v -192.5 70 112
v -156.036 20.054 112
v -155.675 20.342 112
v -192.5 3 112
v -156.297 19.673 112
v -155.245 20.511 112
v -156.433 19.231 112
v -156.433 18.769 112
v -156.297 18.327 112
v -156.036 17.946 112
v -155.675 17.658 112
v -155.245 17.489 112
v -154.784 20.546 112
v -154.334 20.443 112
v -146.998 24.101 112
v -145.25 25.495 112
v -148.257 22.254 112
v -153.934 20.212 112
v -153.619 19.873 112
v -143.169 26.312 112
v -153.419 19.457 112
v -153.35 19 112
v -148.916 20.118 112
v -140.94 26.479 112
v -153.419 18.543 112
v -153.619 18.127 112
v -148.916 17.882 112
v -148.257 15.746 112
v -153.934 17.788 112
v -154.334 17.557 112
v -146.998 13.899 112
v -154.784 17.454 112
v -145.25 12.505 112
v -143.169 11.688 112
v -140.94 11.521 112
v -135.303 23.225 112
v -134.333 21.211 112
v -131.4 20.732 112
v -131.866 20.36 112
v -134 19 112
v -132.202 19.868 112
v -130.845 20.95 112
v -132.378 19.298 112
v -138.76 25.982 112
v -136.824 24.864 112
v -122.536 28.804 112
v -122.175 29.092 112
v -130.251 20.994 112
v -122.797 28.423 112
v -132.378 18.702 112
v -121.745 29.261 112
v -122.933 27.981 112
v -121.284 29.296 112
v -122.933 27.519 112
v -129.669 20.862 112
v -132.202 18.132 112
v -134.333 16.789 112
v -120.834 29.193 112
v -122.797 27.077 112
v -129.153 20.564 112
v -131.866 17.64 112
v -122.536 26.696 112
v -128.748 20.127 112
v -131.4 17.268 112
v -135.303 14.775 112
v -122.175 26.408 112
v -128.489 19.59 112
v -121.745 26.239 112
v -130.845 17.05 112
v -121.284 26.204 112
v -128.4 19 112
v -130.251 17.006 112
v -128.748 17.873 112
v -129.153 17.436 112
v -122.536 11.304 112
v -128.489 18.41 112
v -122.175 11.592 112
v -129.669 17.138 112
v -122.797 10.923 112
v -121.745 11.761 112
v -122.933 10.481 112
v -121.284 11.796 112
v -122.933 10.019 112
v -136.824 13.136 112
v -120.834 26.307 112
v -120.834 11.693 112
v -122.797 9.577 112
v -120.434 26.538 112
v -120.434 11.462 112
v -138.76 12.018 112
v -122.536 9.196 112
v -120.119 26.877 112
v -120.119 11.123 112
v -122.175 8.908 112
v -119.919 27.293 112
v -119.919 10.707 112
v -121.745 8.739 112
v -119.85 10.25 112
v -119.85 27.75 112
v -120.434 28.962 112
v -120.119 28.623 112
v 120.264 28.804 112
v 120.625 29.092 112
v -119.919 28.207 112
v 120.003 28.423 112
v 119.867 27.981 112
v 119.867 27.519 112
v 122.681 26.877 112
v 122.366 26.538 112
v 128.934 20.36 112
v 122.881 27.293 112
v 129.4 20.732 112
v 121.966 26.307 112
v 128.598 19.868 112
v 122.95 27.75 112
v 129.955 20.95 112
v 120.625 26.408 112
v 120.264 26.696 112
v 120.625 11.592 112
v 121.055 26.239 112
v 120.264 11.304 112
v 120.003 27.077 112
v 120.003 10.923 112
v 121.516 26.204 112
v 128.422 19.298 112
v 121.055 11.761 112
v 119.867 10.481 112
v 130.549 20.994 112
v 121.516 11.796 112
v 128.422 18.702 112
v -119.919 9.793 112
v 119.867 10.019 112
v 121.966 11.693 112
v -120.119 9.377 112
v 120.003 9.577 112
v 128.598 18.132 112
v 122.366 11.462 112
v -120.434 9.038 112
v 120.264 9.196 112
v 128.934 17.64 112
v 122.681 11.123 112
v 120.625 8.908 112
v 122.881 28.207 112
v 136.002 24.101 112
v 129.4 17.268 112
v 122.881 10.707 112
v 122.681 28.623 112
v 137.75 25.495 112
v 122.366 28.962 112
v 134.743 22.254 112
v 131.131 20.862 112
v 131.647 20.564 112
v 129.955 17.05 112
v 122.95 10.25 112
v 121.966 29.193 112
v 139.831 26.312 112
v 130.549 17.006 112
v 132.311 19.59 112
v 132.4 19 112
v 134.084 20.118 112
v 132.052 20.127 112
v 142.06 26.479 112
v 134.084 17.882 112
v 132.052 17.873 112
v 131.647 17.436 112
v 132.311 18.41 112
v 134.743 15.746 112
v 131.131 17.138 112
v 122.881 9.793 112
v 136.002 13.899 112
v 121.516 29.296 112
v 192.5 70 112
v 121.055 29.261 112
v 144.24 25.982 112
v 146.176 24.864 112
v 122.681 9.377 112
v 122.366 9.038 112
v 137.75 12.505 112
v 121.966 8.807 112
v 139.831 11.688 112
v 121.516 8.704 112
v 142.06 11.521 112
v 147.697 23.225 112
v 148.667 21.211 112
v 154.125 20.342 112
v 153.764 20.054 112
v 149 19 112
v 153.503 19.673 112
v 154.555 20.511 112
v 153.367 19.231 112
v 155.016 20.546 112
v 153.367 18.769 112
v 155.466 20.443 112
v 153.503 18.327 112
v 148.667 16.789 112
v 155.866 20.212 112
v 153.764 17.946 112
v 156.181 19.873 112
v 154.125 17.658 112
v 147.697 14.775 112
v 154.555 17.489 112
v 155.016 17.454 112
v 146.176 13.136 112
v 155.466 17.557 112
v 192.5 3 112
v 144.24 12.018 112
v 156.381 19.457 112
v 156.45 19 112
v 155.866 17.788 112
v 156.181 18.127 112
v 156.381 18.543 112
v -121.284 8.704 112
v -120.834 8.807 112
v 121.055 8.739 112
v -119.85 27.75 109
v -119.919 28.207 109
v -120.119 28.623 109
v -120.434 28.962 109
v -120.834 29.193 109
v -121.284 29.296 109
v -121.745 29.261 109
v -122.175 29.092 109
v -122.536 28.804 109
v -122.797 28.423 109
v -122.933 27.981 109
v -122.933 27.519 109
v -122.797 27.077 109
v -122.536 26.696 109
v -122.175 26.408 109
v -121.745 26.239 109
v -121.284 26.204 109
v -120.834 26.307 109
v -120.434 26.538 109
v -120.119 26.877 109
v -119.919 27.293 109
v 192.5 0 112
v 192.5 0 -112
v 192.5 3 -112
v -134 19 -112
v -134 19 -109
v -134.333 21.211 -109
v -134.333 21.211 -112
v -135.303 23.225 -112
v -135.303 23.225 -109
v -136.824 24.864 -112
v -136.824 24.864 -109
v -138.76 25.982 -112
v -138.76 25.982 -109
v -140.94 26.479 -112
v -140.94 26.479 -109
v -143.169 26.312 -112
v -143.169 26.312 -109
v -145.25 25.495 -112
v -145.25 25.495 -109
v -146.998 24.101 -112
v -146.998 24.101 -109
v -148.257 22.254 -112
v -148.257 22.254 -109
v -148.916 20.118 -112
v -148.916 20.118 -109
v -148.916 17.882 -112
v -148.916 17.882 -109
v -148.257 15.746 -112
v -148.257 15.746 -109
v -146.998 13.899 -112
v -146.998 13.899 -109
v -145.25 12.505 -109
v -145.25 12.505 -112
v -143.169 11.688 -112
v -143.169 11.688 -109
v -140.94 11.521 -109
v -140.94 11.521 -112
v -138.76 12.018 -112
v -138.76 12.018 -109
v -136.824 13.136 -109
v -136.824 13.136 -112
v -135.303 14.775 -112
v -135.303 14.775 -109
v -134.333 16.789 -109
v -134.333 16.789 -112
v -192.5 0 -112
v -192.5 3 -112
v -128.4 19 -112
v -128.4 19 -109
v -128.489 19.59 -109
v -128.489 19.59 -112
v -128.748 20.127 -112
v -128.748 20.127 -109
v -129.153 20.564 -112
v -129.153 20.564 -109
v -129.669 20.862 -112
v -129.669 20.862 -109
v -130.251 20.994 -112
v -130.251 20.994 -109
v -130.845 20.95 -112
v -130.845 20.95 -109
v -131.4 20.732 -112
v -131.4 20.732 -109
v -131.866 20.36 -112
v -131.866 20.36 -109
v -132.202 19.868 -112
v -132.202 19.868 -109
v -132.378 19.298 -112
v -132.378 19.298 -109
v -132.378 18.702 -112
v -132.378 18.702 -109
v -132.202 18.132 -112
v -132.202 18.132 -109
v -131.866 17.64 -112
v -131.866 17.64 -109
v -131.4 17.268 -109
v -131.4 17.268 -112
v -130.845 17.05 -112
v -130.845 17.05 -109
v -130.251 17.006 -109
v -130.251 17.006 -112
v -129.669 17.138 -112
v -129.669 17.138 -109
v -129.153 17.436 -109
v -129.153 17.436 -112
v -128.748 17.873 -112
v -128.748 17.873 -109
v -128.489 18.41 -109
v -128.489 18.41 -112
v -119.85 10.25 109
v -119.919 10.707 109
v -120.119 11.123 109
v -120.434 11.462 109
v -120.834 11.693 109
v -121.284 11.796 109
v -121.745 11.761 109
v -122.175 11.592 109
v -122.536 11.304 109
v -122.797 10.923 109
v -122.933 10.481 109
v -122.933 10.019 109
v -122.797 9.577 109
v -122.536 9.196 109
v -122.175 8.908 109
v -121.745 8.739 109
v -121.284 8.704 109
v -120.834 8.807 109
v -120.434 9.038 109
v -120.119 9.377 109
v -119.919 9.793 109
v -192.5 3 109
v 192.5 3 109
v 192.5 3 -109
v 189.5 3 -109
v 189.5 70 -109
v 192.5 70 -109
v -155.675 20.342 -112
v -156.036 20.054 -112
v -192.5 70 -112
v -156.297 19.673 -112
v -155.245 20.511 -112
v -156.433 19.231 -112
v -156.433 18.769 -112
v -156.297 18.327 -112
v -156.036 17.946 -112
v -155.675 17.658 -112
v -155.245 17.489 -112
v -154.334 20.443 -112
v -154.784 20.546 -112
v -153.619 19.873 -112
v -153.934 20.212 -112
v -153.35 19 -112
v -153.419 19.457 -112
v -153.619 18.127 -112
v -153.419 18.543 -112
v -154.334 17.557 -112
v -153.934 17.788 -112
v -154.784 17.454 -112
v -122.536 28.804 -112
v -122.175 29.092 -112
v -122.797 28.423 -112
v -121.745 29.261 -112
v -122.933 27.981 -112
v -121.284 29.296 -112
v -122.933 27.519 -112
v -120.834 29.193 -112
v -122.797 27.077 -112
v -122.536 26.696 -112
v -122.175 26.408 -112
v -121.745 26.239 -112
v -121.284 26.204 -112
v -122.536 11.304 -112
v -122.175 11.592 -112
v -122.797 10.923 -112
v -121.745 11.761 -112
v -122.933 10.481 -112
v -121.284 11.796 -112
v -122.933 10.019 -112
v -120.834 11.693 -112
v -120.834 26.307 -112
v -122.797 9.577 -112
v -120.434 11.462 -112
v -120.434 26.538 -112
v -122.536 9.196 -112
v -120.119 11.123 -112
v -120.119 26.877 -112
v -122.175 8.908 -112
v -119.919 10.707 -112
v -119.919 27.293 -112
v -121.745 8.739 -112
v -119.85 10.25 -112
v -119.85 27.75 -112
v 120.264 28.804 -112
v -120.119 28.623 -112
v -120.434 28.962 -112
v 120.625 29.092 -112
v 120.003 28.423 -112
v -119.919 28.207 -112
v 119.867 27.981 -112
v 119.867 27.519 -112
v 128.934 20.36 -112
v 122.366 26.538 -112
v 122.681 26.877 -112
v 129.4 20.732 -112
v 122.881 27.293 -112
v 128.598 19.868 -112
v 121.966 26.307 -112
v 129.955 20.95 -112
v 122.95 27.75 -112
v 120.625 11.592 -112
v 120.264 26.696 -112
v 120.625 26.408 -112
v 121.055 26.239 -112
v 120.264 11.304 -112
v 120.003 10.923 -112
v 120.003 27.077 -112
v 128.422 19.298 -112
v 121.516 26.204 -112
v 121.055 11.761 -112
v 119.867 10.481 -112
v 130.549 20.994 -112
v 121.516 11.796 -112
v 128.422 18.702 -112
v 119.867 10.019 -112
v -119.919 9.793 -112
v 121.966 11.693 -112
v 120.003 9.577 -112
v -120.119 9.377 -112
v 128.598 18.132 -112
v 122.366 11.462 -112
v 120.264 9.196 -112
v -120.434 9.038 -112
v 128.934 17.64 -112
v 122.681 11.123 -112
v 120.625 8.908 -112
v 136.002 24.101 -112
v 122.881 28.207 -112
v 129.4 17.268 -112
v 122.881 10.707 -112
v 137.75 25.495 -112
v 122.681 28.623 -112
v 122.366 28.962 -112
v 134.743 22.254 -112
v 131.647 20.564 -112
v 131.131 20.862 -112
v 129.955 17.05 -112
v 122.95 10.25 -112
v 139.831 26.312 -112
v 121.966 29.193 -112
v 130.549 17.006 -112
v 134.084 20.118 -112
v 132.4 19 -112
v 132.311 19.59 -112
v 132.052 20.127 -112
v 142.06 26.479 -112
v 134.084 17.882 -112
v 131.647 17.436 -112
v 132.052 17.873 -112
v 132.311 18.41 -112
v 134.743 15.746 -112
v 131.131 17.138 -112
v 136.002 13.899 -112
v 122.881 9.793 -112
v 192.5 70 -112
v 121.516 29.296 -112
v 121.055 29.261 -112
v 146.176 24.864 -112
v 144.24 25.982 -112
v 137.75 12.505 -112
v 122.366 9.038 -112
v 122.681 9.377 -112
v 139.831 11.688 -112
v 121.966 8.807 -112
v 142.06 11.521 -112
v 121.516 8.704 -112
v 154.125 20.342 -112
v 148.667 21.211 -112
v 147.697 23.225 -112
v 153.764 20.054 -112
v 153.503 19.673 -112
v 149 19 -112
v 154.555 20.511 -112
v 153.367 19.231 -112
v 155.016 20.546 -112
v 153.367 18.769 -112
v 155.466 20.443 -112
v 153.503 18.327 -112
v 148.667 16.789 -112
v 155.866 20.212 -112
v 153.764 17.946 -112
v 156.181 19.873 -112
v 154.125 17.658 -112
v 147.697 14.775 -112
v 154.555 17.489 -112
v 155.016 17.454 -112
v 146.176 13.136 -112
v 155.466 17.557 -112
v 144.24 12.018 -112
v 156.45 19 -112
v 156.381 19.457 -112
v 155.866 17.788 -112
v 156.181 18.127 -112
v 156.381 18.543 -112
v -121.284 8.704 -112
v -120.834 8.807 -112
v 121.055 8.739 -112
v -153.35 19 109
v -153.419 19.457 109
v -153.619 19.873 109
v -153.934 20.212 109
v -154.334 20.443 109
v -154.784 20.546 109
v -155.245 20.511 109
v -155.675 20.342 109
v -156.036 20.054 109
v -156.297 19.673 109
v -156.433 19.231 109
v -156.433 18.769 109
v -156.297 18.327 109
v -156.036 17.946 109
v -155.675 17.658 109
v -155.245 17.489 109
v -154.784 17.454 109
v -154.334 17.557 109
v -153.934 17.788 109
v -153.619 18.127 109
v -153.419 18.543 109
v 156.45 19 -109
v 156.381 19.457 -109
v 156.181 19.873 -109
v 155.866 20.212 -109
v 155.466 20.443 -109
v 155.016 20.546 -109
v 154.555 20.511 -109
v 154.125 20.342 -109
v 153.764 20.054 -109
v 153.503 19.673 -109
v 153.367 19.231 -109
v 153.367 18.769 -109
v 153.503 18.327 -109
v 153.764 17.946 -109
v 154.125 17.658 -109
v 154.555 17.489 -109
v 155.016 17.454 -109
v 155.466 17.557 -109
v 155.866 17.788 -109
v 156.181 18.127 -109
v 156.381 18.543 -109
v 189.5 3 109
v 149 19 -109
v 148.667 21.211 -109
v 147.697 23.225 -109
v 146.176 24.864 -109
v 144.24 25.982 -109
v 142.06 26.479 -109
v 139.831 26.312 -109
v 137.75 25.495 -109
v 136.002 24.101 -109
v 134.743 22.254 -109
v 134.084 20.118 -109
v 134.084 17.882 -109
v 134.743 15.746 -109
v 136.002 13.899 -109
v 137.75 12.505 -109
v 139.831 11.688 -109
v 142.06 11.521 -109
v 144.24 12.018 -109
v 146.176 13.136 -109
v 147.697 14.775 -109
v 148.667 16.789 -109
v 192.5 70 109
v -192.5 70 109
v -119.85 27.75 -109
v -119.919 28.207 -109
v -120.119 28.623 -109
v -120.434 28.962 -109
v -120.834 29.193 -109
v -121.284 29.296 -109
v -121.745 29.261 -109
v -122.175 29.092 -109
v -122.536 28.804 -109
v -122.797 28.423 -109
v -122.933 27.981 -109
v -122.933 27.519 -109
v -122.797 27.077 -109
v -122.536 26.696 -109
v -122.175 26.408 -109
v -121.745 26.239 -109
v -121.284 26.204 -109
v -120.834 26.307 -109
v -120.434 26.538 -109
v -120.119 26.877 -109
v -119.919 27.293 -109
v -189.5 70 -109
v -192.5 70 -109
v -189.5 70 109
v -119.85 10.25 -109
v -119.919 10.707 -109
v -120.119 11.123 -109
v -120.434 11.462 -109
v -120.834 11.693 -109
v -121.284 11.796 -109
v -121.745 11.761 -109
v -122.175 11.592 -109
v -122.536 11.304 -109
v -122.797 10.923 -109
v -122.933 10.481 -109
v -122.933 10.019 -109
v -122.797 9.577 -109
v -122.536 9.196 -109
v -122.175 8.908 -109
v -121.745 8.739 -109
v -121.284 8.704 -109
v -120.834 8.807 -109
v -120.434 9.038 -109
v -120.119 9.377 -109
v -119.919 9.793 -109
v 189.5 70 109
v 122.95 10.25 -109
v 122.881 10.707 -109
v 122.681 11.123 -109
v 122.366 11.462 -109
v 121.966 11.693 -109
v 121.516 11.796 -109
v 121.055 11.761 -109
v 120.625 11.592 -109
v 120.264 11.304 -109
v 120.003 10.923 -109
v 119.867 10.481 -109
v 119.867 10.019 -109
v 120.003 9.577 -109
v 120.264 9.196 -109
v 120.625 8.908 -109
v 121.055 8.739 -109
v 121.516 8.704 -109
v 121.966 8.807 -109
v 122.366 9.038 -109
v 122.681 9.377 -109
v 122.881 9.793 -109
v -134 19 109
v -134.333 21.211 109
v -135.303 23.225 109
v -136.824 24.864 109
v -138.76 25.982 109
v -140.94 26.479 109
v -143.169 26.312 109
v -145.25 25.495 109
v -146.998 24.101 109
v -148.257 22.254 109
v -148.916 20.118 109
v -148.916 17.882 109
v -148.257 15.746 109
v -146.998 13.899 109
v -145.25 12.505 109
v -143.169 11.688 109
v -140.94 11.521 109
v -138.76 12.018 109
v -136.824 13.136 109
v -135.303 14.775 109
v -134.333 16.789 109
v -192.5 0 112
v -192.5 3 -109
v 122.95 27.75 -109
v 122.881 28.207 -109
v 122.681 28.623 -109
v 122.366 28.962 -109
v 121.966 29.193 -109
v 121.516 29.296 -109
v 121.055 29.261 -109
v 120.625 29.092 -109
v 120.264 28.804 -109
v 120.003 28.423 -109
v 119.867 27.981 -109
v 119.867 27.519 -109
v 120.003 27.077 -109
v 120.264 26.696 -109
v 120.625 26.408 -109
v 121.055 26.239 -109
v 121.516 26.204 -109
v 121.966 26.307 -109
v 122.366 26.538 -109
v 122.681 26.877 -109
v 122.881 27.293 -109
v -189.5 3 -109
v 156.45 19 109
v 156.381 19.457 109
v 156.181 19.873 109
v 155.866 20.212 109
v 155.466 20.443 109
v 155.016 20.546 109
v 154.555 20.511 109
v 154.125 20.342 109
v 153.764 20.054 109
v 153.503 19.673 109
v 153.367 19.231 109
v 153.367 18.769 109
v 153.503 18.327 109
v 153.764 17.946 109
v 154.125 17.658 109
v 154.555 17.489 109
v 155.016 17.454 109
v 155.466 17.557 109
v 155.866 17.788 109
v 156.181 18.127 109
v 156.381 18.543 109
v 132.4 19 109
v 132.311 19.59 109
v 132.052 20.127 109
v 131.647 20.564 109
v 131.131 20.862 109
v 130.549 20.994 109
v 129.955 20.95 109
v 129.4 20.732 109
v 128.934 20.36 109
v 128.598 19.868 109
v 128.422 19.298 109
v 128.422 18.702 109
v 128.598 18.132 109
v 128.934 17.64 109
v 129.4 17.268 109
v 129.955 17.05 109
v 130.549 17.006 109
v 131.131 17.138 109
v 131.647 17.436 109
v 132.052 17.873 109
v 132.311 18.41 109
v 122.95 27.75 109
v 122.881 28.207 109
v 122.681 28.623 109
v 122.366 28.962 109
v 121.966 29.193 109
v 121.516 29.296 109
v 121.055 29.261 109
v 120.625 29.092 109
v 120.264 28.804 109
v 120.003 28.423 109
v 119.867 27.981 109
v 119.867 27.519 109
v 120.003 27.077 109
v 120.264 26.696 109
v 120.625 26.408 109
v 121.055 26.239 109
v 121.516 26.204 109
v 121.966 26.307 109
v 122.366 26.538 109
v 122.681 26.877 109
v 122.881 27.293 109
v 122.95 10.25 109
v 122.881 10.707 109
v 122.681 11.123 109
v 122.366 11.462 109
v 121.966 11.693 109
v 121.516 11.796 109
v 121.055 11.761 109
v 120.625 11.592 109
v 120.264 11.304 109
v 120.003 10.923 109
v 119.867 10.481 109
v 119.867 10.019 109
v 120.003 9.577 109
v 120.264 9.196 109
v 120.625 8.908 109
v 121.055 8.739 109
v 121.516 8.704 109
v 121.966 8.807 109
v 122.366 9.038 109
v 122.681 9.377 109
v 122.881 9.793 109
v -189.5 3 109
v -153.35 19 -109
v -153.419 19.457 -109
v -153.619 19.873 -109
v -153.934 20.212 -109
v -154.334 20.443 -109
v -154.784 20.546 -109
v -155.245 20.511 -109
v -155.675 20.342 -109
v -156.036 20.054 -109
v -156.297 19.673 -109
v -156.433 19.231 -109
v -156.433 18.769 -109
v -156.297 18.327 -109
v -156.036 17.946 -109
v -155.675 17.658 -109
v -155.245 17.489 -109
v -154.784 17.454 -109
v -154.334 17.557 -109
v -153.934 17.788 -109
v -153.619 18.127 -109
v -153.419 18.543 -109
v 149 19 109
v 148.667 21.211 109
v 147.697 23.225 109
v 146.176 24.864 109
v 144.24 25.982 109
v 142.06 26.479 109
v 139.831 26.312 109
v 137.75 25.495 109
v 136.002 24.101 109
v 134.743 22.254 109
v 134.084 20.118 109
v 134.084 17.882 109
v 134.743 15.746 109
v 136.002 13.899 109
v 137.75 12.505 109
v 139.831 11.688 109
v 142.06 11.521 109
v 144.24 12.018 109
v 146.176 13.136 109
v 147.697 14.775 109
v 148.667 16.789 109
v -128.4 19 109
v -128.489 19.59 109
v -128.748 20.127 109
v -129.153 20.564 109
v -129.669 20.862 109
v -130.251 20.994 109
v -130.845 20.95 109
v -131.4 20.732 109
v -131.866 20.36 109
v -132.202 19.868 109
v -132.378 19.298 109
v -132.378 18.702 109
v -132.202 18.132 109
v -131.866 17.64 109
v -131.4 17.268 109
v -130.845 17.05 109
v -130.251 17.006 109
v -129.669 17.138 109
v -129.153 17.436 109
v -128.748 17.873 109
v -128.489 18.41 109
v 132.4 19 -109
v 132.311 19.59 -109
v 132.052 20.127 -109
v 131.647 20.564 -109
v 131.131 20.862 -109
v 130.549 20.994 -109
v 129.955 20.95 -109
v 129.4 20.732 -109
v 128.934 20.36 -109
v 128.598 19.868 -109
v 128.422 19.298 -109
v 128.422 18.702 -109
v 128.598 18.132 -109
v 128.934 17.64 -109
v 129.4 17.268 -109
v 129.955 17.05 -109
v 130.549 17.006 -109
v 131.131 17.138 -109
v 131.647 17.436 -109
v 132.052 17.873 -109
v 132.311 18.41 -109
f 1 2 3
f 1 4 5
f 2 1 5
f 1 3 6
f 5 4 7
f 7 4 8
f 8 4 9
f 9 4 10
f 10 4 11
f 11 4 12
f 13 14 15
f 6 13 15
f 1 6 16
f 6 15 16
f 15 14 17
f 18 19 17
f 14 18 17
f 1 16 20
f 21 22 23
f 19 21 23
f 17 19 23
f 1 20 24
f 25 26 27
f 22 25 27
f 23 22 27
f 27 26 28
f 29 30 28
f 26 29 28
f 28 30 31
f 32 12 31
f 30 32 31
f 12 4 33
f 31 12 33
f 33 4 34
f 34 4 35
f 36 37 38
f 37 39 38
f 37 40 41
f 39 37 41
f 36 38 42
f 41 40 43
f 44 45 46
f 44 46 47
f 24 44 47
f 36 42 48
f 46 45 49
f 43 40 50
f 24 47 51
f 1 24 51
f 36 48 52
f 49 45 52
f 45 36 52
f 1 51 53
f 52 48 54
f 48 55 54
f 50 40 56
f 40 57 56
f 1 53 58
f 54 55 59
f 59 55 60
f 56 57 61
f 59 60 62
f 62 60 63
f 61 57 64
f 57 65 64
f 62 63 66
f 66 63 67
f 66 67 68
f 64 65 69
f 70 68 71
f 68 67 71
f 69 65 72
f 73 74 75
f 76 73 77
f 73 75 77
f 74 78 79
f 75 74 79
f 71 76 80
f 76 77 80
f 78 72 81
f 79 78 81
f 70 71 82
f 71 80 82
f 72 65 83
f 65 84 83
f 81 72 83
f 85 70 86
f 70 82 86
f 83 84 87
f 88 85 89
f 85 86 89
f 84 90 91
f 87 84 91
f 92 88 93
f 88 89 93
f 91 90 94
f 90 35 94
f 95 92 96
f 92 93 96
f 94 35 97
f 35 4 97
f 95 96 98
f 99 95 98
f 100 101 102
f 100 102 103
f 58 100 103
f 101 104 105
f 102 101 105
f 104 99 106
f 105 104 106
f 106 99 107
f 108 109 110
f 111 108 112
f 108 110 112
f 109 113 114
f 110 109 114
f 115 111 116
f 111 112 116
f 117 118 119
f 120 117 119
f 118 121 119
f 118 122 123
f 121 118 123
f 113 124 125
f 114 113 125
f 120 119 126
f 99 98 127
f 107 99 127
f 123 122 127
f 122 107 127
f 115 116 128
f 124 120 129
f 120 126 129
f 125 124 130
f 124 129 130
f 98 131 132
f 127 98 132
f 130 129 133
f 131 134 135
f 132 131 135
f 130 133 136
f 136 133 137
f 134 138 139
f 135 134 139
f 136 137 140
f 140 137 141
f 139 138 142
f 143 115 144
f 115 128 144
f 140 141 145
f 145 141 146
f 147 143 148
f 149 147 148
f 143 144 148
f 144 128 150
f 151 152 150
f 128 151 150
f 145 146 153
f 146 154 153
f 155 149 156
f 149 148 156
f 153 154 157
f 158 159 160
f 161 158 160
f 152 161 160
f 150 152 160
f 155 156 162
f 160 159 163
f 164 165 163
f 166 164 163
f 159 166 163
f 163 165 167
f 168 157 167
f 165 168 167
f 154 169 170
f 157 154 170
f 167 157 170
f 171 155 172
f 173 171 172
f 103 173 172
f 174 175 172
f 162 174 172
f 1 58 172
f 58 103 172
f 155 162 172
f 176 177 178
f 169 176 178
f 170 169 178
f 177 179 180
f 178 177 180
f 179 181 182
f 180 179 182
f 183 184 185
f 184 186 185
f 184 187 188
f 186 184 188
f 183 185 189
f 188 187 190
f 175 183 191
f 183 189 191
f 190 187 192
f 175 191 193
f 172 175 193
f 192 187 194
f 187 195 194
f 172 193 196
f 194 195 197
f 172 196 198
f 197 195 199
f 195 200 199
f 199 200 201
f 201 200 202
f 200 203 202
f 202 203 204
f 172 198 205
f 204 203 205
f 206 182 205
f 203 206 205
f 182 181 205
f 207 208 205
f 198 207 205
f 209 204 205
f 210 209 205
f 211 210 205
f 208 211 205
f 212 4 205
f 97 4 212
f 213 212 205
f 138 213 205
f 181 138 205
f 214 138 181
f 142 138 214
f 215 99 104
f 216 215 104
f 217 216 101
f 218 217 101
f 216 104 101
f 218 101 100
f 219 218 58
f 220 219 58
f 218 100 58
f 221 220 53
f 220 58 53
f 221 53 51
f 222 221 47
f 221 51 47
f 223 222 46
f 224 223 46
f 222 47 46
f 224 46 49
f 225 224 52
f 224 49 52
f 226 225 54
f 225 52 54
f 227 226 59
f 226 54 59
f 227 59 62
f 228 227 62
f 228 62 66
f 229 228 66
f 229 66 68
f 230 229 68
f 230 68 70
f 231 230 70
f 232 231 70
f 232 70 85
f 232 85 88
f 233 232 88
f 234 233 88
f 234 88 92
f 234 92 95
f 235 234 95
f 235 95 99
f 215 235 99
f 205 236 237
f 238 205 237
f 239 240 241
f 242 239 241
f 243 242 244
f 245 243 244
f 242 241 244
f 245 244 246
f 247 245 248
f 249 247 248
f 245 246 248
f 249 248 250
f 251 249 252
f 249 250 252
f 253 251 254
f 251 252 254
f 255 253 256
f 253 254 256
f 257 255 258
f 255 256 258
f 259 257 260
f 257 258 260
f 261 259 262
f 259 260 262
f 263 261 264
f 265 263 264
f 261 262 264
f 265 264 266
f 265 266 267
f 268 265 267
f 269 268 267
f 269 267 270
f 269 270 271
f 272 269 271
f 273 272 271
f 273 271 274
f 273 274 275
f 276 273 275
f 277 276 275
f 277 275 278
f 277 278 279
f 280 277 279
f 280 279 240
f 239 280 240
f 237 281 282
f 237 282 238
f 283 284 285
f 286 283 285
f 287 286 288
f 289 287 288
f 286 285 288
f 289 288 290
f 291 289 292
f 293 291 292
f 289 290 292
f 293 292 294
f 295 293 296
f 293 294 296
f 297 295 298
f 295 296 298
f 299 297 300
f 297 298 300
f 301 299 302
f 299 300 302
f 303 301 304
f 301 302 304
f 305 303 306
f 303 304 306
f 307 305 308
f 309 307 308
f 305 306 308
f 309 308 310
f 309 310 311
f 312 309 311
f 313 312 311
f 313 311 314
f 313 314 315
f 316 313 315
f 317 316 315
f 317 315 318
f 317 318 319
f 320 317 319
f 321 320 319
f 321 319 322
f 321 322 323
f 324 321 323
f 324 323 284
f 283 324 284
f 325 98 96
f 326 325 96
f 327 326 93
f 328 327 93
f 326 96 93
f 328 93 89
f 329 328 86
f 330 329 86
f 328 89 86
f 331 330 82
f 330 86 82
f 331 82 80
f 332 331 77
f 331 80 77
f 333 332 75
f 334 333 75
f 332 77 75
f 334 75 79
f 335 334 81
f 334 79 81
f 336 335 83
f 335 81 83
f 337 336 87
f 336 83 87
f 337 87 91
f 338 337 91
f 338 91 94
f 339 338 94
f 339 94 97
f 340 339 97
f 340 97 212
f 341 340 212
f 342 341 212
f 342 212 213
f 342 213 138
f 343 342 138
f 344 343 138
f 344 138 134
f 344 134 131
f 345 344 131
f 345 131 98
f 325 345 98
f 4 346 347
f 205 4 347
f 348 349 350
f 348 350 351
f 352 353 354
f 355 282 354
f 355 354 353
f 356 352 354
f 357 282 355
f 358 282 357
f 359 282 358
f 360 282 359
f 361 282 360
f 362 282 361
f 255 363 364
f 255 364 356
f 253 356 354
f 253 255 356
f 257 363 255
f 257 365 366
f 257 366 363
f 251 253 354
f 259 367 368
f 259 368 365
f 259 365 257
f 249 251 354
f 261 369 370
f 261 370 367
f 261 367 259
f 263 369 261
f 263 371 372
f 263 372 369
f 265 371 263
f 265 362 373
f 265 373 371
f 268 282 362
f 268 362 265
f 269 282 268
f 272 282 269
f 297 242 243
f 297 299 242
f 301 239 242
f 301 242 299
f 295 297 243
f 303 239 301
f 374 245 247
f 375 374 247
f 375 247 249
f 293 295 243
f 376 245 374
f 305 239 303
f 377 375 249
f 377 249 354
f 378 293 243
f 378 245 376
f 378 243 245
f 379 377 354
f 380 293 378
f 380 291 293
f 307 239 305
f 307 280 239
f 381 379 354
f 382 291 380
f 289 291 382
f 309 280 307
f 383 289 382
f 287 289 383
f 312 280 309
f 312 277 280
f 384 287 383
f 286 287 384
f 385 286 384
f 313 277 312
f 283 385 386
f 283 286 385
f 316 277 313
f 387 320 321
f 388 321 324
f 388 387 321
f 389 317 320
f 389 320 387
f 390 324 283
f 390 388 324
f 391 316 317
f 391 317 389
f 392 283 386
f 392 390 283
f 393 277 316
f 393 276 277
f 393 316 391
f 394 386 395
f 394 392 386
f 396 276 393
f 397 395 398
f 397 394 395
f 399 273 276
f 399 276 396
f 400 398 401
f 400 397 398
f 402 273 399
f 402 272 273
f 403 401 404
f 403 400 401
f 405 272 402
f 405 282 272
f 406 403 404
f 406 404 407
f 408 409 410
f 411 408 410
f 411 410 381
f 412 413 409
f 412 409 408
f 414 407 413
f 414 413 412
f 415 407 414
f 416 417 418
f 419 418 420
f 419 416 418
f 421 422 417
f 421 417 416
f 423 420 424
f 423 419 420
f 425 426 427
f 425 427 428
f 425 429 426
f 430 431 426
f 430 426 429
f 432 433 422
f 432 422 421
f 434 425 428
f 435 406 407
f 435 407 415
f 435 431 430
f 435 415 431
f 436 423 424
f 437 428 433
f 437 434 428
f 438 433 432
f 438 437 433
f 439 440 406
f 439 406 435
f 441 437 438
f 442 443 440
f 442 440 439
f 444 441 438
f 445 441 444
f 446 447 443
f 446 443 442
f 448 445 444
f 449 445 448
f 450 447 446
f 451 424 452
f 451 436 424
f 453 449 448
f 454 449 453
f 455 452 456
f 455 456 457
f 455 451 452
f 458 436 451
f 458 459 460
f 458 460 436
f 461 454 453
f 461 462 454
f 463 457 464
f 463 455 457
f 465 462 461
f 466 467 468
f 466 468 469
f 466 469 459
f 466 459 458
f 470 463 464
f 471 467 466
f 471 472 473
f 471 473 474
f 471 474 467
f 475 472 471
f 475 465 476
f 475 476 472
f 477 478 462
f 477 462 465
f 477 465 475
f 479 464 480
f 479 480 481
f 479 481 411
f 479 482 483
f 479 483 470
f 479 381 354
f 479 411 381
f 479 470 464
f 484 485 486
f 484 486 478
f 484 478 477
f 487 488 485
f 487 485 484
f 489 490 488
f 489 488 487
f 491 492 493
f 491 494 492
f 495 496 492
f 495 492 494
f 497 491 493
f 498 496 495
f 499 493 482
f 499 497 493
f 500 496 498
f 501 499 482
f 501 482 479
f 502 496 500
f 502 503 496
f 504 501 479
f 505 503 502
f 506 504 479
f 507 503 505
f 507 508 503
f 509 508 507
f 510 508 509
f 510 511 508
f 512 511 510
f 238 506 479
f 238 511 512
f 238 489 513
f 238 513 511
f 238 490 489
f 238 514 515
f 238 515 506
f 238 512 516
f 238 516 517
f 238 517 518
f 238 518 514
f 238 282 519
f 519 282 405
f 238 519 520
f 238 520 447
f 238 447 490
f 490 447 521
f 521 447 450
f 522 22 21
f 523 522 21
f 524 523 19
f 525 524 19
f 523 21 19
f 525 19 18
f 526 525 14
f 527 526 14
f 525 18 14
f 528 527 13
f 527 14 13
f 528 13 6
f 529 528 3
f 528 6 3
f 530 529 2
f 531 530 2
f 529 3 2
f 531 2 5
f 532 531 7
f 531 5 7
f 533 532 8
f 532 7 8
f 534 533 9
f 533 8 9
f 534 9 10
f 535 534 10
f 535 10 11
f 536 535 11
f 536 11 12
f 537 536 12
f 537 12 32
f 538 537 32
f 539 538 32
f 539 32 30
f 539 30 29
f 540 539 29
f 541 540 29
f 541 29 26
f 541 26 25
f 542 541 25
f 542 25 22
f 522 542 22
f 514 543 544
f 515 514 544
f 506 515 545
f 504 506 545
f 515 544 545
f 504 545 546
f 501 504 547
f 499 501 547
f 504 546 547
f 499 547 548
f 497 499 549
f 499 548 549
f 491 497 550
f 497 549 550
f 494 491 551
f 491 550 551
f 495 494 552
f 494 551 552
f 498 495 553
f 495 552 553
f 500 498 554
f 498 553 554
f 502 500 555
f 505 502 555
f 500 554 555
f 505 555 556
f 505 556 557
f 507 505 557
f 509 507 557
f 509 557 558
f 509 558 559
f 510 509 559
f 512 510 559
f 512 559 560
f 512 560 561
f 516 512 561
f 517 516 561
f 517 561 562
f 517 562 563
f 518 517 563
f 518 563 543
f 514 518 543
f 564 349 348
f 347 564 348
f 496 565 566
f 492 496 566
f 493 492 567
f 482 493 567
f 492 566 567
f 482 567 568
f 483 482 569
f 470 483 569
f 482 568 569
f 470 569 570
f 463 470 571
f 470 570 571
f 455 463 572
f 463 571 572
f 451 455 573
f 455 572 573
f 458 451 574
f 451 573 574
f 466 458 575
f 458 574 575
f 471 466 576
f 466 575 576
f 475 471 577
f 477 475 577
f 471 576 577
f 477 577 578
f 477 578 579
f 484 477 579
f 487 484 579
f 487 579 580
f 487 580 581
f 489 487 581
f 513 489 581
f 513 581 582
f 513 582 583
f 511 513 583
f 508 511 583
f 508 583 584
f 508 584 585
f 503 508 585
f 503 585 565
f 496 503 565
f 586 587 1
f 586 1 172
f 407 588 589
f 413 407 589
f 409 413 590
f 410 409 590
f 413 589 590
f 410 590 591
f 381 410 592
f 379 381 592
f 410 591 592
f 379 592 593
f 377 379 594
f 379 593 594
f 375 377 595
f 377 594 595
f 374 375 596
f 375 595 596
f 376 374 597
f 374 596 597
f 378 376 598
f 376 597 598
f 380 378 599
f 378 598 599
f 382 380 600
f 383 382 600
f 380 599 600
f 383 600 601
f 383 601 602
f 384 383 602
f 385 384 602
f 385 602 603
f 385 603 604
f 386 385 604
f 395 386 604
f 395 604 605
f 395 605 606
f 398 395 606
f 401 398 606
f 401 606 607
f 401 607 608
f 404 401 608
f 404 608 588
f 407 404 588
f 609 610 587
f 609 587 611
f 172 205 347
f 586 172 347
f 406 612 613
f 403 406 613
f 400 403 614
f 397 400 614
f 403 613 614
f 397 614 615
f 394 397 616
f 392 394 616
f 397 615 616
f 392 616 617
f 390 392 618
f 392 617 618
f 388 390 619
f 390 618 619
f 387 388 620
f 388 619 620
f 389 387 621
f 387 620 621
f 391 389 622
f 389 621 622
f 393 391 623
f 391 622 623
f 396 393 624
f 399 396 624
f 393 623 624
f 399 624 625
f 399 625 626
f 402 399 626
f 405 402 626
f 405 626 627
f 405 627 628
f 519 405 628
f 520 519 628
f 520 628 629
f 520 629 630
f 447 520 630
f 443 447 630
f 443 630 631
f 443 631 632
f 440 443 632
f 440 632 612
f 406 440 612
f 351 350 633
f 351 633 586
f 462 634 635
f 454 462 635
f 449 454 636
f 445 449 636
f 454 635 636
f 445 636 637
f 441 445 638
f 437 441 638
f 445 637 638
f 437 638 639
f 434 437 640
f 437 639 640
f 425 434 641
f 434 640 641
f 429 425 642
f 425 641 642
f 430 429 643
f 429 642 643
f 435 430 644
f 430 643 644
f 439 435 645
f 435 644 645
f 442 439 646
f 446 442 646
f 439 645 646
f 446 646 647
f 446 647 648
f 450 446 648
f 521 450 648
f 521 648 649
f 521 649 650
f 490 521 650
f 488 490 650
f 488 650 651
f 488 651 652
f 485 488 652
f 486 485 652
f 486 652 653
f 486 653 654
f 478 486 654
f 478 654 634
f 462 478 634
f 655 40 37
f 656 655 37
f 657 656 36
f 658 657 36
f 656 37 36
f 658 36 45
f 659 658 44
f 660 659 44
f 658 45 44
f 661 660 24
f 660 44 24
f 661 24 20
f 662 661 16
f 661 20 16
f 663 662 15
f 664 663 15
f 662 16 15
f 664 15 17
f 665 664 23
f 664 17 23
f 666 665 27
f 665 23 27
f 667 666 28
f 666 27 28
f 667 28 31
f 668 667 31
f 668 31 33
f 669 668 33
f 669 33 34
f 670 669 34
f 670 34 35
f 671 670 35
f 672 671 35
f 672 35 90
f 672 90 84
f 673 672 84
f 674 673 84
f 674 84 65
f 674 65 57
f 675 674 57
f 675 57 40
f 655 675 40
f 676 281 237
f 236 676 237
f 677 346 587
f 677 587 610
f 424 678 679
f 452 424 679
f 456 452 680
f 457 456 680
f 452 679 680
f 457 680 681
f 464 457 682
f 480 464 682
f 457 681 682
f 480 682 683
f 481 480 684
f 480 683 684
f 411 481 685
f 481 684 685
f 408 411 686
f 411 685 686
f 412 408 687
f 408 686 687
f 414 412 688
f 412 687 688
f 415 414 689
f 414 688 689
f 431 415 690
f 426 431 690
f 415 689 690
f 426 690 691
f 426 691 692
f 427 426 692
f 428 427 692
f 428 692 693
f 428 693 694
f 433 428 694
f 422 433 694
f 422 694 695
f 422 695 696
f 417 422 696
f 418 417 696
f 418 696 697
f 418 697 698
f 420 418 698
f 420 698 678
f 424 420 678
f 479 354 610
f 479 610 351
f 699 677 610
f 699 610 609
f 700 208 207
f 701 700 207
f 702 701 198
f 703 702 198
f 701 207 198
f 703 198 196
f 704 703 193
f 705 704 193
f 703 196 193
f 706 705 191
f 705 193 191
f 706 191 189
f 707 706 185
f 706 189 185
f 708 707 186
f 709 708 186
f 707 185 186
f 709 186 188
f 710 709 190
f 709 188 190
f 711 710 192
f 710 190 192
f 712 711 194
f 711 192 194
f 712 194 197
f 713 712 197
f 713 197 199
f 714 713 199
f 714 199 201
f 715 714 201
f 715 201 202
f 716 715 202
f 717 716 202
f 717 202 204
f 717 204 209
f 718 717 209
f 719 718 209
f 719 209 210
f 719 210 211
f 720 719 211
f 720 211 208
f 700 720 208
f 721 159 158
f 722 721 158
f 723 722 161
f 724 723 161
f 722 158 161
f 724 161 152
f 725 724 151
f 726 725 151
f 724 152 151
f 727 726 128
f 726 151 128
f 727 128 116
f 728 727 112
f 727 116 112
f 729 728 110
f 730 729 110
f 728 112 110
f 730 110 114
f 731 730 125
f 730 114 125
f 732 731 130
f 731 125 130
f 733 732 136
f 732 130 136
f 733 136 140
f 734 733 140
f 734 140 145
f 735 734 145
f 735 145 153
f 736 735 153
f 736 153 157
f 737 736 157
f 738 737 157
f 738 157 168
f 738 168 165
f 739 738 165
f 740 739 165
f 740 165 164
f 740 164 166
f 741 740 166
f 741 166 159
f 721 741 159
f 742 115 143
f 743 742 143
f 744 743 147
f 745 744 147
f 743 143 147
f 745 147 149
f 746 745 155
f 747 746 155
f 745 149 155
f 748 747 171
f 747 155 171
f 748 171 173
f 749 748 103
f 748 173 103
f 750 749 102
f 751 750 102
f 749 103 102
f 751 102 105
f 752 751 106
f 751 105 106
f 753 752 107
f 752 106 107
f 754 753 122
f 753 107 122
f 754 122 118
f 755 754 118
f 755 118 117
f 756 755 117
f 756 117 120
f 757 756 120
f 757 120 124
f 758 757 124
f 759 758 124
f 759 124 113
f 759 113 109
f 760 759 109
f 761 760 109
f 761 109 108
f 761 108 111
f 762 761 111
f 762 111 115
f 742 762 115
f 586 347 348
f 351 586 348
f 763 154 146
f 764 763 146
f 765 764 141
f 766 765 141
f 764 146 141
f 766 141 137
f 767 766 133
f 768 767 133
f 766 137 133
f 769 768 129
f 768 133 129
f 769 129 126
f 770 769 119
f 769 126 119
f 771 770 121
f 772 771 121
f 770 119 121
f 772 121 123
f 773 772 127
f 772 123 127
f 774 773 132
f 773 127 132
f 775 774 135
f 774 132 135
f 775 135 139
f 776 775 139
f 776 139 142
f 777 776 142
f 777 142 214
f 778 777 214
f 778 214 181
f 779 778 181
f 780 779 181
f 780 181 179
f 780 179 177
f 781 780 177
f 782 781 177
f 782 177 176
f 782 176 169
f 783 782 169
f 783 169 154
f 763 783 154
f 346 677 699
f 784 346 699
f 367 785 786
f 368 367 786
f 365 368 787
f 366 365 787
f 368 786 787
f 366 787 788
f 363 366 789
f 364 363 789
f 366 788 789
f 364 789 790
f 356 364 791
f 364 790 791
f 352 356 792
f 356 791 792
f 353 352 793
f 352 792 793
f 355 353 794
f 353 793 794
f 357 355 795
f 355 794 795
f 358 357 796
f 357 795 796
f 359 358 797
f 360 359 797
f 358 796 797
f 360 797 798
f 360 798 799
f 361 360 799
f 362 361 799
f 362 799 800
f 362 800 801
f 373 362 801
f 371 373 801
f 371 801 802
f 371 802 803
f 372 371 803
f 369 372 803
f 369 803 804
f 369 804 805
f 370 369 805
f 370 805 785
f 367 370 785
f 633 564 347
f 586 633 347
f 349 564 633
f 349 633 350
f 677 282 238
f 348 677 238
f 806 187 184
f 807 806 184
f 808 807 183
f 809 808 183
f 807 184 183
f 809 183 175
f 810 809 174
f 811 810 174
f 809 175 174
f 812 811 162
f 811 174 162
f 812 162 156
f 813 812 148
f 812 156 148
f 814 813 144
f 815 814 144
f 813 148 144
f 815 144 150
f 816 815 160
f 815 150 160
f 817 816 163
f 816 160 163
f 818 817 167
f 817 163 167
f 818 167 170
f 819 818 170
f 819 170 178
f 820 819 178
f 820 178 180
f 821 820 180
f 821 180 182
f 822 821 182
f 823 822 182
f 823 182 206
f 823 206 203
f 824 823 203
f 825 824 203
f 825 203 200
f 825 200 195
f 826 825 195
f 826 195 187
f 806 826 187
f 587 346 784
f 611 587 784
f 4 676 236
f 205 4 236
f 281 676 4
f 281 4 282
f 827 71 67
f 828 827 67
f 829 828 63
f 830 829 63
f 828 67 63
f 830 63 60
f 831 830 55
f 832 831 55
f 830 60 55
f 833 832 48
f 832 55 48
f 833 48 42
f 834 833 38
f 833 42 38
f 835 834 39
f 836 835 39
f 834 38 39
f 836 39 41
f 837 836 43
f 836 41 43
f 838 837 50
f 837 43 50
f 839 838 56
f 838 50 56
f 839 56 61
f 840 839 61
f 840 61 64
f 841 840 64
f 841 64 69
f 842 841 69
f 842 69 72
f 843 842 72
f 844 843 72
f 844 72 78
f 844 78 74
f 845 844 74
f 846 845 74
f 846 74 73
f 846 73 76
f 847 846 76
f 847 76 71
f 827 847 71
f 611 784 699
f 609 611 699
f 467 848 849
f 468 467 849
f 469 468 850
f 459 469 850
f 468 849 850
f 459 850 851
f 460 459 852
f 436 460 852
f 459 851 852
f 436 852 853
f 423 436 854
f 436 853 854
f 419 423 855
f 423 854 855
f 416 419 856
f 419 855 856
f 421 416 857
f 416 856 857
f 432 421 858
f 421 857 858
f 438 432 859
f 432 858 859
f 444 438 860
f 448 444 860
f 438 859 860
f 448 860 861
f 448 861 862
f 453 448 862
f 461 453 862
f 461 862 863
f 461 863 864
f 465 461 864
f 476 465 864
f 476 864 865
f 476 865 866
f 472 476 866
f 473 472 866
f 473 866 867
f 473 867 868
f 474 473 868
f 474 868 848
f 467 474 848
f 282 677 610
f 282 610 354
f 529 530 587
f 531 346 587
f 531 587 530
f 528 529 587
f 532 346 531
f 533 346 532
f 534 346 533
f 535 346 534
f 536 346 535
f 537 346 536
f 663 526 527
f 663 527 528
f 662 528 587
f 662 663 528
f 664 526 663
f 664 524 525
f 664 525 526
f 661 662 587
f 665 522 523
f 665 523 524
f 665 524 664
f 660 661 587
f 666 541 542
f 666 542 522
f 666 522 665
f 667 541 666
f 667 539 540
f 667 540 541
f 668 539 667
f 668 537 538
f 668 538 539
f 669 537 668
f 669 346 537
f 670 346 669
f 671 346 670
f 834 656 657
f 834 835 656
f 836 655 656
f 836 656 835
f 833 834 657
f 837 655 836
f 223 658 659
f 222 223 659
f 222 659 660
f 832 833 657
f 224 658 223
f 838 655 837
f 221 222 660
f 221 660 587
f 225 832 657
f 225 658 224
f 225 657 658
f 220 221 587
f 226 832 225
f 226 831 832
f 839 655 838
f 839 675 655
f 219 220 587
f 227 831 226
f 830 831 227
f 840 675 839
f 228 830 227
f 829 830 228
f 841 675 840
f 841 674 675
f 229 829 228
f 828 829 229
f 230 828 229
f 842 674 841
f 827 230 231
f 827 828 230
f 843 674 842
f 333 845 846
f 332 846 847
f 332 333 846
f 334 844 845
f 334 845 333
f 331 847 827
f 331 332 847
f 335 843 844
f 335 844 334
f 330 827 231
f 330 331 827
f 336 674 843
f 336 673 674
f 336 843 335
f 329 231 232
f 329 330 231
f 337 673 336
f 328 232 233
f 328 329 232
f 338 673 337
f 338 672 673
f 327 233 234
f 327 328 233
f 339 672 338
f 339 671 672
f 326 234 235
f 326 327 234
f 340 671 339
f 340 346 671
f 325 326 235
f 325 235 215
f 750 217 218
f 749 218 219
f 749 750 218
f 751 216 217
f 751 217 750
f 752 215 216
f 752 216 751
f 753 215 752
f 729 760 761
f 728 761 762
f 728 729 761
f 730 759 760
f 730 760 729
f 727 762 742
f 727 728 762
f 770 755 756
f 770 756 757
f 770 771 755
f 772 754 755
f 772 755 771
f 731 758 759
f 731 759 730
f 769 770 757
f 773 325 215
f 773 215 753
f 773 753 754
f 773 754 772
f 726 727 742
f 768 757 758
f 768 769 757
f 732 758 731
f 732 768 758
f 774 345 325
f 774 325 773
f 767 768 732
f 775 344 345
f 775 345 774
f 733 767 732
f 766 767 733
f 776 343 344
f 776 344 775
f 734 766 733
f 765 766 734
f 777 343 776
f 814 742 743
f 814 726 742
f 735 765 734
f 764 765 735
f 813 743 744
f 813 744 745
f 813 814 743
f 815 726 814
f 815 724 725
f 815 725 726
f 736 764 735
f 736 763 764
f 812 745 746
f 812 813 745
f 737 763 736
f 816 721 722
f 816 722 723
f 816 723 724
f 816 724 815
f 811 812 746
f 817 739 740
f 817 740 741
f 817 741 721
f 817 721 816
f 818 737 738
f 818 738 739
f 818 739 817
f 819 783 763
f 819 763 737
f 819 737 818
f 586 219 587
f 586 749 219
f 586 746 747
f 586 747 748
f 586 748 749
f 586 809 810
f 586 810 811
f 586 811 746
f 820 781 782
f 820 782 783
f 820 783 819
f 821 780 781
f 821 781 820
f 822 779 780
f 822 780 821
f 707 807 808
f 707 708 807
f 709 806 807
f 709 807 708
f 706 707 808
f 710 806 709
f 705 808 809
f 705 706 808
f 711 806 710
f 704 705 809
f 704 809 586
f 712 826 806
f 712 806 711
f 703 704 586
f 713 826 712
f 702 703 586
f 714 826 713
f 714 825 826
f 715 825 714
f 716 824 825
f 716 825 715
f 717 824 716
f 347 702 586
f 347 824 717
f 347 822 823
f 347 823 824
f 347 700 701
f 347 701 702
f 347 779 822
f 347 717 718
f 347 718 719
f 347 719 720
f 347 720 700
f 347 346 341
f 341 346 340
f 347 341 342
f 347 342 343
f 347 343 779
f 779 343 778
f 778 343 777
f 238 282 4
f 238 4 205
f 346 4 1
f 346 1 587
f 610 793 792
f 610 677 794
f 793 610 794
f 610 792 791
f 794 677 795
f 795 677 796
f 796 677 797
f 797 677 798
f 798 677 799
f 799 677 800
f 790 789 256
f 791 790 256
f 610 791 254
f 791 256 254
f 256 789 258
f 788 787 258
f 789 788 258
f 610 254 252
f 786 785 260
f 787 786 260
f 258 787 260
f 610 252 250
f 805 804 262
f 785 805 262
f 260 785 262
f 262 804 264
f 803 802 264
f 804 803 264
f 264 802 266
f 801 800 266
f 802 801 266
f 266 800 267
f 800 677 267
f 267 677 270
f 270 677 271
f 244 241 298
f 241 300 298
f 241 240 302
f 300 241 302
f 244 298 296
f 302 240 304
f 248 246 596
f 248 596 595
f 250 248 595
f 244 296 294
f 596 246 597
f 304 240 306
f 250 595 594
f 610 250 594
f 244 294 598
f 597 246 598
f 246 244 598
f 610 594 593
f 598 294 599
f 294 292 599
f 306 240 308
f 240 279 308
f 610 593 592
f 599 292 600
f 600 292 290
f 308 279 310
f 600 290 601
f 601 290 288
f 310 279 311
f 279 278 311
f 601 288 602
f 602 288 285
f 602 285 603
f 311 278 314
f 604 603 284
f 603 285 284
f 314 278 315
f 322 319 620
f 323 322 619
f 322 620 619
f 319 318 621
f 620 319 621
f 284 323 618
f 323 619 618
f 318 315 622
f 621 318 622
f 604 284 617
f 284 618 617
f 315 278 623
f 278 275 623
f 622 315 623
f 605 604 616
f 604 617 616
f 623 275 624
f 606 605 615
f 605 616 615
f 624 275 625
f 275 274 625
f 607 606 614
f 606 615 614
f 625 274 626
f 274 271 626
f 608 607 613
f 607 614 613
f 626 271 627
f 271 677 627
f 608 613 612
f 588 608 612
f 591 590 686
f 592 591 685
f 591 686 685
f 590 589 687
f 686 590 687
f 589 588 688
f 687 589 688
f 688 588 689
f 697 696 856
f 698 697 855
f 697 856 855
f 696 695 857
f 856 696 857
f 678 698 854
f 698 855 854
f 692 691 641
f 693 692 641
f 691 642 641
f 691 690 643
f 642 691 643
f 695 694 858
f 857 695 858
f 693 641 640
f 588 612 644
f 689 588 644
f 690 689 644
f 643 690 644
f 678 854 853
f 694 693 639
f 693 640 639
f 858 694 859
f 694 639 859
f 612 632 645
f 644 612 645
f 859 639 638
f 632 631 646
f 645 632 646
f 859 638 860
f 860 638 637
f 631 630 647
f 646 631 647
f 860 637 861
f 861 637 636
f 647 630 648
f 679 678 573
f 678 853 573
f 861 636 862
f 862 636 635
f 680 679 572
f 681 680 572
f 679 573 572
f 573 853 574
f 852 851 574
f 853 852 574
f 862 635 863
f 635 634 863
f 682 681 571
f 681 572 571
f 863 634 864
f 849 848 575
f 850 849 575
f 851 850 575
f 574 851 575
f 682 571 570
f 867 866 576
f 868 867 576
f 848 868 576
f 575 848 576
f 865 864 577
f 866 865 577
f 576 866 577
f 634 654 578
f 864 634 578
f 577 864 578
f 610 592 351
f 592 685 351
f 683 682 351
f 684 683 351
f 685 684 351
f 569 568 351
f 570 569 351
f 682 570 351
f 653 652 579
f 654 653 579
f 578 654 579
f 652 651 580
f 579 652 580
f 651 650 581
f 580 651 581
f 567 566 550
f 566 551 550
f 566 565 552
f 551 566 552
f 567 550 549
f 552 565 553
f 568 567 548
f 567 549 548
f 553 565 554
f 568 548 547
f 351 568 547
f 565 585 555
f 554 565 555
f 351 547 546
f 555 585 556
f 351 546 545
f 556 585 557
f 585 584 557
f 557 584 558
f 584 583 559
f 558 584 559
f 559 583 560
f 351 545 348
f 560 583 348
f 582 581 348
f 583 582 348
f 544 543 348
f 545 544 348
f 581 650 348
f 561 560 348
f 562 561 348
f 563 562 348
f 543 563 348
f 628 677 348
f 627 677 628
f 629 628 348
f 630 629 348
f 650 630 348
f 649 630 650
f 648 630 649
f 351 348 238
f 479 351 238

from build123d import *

# Parameters (mm, degrees)
CROQUIS1_W                = 385
CROQUIS1_H                = 224
SALIENTE_EXTRUIR1_DEPTH   = 3
CROQUIS3_W                = 385
CROQUIS3_H                = 3
SALIENTE_EXTRUIR2_DEPTH   = 67
SALIENTE_EXTRUIR2_2_DEPTH = 67
CROQUIS4_W                = 3
CROQUIS4_H                = 218
SALIENTE_EXTRUIR3_DEPTH   = 67
SALIENTE_EXTRUIR3_2_DEPTH = 67
CROQUIS5_R                = 7.5
CROQUIS5_R_2              = 1.55
CROQUIS5_R_3              = 2
CORTAR_EXTRUIR1_DEPTH     = 224


with BuildPart() as part:
    # Croquis1 → Saliente-Extruir1 (new body)
    with BuildSketch(Plane(origin=(0, 0, 0), x_dir=(1, 0, 0), z_dir=(0, 1, 0))):
        Rectangle(CROQUIS1_W, CROQUIS1_H)
    extrude(amount=SALIENTE_EXTRUIR1_DEPTH)


with BuildPart() as body_2:
    # Croquis3 → Saliente-Extruir2 (new body)
    with BuildSketch(Plane(origin=(0, 3, 0), x_dir=(1, 0, 0), z_dir=(0, 1, 0))):
        with Locations((0, 110.5)):
            Rectangle(CROQUIS3_W, CROQUIS3_H)
    extrude(amount=SALIENTE_EXTRUIR2_DEPTH)


with BuildPart() as body_3:
    # Croquis3 → Saliente-Extruir2 2 (new body)
    with BuildSketch(Plane(origin=(0, 3, 0), x_dir=(1, 0, 0), z_dir=(0, 1, 0))):
        with Locations((0, -110.5)):
            Rectangle(CROQUIS3_W, CROQUIS3_H)
    extrude(amount=SALIENTE_EXTRUIR2_2_DEPTH)


with BuildPart() as body_4:
    # Croquis4 → Saliente-Extruir3 (new body)
    with BuildSketch(Plane(origin=(0, 3, 0), x_dir=(1, 0, 0), z_dir=(0, 1, 0))):
        with Locations((-191, 0)):
            Rectangle(CROQUIS4_W, CROQUIS4_H)
    extrude(amount=SALIENTE_EXTRUIR3_DEPTH)


with BuildPart() as body_5:
    # Croquis4 → Saliente-Extruir3 2 (new body)
    with BuildSketch(Plane(origin=(0, 3, 0), x_dir=(1, 0, 0), z_dir=(0, 1, 0))):
        with Locations((191, 0)):
            Rectangle(CROQUIS4_W, CROQUIS4_H)
    extrude(amount=SALIENTE_EXTRUIR3_2_DEPTH)


with BuildPart() as cortar_extruir1_tool:
    # Croquis5 → Cortar-Extruir1 (new body)
    with BuildSketch(Plane.XY.offset(112)):
        with Locations((-141.5, 19)):
            Circle(CROQUIS5_R)
        with Locations((141.5, 19)):
            Circle(CROQUIS5_R)
        with Locations((-121.4, 27.75)):
            Circle(CROQUIS5_R_2)
        with Locations((-121.4, 10.25)):
            Circle(CROQUIS5_R_2)
        with Locations((-154.9, 19)):
            Circle(CROQUIS5_R_2)
        with Locations((121.4, 27.75)):
            Circle(CROQUIS5_R_2)
        with Locations((121.4, 10.25)):
            Circle(CROQUIS5_R_2)
        with Locations((154.9, 19)):
            Circle(CROQUIS5_R_2)
        with Locations((-130.4, 19)):
            Circle(CROQUIS5_R_3)
        with Locations((130.4, 19)):
            Circle(CROQUIS5_R_3)
    extrude(amount=-CORTAR_EXTRUIR1_DEPTH)


with BuildPart() as body_2_1:
    add(body_2.part)

    # Cortar-Extruir1: cut by cortar_extruir1_tool
    add(cortar_extruir1_tool.part, mode=Mode.SUBTRACT)


with BuildPart() as body_3_1:
    add(body_3.part)

    # Cortar-Extruir1: cut by cortar_extruir1_tool
    add(cortar_extruir1_tool.part, mode=Mode.SUBTRACT)


solid = Compound([part.part, body_4.part, body_5.part, body_2_1.part, body_3_1.part])
